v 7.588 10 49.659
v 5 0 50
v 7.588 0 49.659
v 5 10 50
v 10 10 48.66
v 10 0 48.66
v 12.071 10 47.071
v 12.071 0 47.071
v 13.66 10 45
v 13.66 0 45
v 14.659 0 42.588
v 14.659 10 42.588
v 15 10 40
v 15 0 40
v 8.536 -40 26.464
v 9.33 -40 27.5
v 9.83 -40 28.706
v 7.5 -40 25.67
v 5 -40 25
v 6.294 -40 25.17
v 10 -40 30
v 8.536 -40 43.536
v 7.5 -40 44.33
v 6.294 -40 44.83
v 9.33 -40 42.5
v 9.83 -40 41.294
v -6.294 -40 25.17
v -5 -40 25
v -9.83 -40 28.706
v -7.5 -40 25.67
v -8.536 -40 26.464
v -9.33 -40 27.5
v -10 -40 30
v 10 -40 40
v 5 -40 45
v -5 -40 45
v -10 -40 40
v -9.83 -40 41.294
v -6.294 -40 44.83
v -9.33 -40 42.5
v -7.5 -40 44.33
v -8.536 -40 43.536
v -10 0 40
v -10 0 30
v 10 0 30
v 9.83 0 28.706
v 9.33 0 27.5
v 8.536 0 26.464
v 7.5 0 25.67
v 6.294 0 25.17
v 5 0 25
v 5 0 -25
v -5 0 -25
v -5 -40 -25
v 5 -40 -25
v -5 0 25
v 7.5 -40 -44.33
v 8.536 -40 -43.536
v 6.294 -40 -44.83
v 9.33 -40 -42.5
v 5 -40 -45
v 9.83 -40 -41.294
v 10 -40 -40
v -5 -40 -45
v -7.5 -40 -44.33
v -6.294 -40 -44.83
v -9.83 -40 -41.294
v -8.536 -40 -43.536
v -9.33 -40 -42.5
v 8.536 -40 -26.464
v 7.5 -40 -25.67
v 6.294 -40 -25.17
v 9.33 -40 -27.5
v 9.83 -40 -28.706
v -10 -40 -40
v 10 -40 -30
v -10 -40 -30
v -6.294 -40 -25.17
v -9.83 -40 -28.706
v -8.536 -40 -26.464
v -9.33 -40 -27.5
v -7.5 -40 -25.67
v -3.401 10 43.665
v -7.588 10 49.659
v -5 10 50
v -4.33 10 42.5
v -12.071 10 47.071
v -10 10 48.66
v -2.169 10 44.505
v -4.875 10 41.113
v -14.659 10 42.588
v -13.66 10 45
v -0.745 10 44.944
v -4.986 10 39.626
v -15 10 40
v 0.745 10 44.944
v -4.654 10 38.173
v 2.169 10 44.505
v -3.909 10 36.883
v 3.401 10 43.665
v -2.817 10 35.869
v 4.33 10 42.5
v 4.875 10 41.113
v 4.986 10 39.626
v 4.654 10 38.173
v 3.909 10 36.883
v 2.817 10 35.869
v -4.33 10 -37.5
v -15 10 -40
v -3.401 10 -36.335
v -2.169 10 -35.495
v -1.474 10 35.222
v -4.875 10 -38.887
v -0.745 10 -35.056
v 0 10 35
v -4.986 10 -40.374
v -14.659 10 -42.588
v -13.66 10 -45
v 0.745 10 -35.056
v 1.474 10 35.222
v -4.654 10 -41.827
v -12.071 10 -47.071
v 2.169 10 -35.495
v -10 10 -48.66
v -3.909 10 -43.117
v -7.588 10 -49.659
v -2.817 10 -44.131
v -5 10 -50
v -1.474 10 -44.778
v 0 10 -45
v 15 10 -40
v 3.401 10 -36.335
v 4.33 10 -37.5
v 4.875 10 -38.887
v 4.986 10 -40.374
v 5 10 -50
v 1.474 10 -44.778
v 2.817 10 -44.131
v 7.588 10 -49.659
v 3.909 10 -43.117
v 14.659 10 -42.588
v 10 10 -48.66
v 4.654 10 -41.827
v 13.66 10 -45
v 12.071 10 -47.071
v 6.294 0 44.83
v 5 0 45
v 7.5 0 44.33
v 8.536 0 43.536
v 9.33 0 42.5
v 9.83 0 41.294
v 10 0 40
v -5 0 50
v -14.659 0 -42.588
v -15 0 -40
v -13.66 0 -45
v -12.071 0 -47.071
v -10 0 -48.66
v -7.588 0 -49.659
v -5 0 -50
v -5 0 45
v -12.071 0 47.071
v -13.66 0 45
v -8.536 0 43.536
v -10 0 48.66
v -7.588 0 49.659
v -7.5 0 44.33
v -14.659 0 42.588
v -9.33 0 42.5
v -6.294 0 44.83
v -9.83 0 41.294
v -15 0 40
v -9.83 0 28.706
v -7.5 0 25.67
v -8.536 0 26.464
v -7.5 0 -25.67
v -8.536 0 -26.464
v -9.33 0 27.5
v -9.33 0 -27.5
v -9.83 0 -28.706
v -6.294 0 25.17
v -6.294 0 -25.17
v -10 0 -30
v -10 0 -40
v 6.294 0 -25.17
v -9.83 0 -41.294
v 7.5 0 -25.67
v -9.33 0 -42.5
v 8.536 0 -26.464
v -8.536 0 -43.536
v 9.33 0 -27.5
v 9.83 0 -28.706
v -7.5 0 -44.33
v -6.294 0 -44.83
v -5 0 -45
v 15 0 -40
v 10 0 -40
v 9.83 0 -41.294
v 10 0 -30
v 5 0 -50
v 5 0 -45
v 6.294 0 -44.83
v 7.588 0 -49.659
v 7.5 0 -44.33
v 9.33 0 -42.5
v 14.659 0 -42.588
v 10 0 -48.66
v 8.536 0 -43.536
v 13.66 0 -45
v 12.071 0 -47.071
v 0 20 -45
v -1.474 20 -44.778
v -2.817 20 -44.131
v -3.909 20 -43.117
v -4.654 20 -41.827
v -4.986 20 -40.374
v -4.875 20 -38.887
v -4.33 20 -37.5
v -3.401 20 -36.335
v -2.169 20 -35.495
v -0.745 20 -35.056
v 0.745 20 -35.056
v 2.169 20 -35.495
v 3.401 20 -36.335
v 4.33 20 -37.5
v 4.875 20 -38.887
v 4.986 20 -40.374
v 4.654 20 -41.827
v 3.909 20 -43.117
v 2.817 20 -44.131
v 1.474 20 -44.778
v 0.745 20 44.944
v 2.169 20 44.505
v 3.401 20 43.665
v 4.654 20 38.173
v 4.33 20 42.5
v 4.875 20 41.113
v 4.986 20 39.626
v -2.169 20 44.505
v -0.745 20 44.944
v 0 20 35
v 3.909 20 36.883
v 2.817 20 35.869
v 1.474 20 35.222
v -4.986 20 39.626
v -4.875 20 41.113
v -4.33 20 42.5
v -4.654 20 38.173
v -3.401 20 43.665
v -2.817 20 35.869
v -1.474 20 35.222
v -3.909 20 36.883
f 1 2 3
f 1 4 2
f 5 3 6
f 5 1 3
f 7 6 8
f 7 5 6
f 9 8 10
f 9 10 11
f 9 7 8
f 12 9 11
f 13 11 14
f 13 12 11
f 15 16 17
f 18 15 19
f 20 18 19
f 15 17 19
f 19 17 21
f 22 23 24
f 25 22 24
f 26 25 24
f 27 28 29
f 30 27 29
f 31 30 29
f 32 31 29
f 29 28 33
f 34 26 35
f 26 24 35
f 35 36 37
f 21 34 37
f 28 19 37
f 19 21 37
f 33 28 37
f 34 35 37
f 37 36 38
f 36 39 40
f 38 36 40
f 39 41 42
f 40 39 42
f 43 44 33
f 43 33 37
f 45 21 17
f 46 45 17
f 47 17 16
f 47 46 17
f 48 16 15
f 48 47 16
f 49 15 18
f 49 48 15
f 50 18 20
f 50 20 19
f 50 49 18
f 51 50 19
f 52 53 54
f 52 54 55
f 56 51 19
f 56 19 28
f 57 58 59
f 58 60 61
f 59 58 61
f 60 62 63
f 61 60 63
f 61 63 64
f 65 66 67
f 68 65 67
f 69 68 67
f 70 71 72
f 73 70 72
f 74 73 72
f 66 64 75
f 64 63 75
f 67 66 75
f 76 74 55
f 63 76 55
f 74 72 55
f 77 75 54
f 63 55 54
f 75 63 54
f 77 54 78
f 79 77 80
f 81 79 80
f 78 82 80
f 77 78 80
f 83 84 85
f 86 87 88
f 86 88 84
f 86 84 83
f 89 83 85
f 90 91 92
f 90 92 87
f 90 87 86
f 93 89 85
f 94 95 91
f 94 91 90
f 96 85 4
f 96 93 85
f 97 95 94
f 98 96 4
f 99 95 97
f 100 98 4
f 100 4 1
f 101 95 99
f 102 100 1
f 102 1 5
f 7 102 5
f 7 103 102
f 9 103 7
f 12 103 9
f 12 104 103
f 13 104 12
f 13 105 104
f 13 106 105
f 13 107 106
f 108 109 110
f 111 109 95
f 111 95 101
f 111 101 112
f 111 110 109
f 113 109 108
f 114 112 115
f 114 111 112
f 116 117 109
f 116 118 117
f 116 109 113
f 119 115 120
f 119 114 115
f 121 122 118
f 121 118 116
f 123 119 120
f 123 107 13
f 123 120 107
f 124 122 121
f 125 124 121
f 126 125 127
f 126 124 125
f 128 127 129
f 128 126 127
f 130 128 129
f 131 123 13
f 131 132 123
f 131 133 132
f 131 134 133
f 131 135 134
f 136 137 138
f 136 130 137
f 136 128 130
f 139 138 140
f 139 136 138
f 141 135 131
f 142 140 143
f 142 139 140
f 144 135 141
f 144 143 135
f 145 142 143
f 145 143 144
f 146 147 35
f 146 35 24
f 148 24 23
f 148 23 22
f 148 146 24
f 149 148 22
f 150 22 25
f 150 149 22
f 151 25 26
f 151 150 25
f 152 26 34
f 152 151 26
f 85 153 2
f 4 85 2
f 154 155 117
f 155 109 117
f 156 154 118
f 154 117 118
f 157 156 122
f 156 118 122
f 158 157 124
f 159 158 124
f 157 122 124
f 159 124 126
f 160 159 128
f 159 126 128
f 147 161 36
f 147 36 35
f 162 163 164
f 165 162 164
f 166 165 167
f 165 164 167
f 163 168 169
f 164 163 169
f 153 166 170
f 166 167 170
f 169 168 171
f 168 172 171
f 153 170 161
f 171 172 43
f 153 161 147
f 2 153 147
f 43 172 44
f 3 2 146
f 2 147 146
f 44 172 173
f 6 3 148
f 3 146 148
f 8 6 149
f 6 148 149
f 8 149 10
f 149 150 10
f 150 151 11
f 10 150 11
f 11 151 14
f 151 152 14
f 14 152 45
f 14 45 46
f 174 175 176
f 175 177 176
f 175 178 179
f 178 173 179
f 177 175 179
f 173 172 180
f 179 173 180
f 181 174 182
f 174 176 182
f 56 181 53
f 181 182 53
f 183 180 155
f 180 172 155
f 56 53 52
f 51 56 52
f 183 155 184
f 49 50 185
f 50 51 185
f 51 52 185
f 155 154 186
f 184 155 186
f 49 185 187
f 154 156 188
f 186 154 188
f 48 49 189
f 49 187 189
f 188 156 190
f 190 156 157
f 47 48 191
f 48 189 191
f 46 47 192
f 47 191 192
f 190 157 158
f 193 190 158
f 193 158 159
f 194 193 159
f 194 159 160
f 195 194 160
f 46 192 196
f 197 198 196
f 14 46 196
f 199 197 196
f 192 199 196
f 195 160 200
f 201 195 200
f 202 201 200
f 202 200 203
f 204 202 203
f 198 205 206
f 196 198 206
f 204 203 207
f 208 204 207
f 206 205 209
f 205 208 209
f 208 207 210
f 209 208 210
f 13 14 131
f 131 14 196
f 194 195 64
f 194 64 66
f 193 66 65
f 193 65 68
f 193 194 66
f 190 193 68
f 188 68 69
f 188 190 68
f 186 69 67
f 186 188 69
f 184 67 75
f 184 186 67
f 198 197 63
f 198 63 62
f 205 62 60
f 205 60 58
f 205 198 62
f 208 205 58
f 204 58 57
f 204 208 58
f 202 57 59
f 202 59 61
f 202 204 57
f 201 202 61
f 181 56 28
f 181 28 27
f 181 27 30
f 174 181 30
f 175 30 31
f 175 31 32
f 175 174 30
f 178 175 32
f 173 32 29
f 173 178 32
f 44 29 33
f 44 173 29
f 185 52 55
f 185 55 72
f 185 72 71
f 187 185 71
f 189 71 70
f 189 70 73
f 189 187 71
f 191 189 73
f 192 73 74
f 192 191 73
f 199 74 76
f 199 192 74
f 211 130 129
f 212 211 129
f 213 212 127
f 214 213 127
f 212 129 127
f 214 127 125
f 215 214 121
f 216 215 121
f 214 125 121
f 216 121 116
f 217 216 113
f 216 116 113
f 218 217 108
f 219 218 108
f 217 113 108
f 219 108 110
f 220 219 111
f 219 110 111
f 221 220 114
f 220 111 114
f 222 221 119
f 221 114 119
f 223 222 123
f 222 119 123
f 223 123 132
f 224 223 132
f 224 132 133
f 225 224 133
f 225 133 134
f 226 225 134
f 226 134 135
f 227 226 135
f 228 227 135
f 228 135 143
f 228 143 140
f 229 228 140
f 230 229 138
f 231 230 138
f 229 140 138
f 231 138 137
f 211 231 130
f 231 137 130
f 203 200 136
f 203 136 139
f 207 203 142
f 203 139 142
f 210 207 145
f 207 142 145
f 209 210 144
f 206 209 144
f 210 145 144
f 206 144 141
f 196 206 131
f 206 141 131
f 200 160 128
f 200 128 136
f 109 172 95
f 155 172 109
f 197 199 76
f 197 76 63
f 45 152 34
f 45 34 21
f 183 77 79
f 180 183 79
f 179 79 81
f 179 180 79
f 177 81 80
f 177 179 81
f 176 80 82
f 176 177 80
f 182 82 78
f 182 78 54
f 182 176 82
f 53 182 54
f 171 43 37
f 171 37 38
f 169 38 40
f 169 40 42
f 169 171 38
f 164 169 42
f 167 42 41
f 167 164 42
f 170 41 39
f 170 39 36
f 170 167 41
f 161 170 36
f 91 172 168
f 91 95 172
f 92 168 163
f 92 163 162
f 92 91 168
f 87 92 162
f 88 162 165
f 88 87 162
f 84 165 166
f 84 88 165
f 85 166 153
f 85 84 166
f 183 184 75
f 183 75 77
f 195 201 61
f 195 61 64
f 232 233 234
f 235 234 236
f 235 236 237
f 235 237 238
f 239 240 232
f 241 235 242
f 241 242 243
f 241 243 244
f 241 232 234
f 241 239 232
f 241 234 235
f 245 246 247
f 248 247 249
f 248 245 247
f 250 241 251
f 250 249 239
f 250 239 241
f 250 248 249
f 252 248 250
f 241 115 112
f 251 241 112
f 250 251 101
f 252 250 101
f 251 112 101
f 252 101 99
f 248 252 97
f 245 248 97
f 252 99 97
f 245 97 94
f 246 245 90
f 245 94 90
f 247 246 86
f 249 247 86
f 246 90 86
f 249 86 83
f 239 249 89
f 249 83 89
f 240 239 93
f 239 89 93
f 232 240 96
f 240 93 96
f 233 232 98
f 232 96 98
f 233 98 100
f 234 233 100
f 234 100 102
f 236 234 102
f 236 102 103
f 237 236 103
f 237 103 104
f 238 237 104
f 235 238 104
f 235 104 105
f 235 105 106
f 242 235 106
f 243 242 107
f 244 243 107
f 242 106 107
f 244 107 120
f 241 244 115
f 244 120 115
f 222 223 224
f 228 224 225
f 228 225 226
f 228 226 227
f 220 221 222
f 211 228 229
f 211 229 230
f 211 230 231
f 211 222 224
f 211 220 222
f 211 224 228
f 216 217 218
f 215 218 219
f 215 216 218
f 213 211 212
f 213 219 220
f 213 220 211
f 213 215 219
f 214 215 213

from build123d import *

# Parameters (mm, degrees)
SKETCH1_W           = 30
SKETCH1_H           = 100
BOSS_EXTRUDE1_DEPTH = 10
SKETCH2_R           = 5
BOSS_EXTRUDE2_DEPTH = 10
FILLET1_R           = 10
BOSS_EXTRUDE3_DEPTH = 40


with BuildPart() as part:
    # Sketch1 → Boss-Extrude1 (new body)
    with BuildSketch(Plane(origin=(0, 0, 0), x_dir=(1, 0, 0), z_dir=(0, 1, 0))):
        Rectangle(SKETCH1_W, SKETCH1_H)
    extrude(amount=BOSS_EXTRUDE1_DEPTH)

    # Sketch2 → Boss-Extrude2 (add)
    with BuildSketch(Plane(origin=(0, 10, 0), x_dir=(1, 0, 0), z_dir=(0, 1, 0))):
        with Locations(Location((0, 40, 0), (0, 0, 90))):
            Circle(SKETCH2_R)
        with Locations(Location((0, -40, 0), (0, 0, 90))):
            Circle(SKETCH2_R)
    extrude(amount=BOSS_EXTRUDE2_DEPTH)

    # Fillet1
    fillet1_edges = [part.edges().sort_by_distance(p)[0] for p in [
        (15, 5, 50),
        (-15, 5, 50),
        (-15, 5, -50),
        (15, 5, -50),
    ]]
    fillet(fillet1_edges, radius=FILLET1_R)

    # Sketch3 → Boss-Extrude3 (add)
    with BuildSketch(Plane.XZ):
        with BuildLine():
            Line((-10, 30), (-10, 40))
            ThreePointArc((-10, 40), (-8.535533906, 43.535533906), (-5, 45))
            Line((-5, 45), (5, 45))
            ThreePointArc((5, 45), (8.535533906, 43.535533906), (10, 40))
            Line((10, 40), (10, 30))
            ThreePointArc((10, 30), (8.535533906, 26.464466094), (5, 25))
            Line((5, 25), (-5, 25))
            ThreePointArc((-5, 25), (-8.535533906, 26.464466094), (-10, 30))
        make_face()
        with BuildLine():
            Line((5, -45), (-5, -45))
            ThreePointArc((-5, -45), (-8.535533906, -43.535533906), (-10, -40))
            Line((-10, -40), (-10, -30))
            ThreePointArc((-10, -30), (-8.535533906, -26.464466094), (-5, -25))
            Line((-5, -25), (5, -25))
            ThreePointArc((5, -25), (8.535533906, -26.464466094), (10, -30))
            Line((10, -30), (10, -40))
            ThreePointArc((10, -40), (8.535533906, -43.535533906), (5, -45))
        make_face()
    extrude(amount=BOSS_EXTRUDE3_DEPTH)


solid = part.part
